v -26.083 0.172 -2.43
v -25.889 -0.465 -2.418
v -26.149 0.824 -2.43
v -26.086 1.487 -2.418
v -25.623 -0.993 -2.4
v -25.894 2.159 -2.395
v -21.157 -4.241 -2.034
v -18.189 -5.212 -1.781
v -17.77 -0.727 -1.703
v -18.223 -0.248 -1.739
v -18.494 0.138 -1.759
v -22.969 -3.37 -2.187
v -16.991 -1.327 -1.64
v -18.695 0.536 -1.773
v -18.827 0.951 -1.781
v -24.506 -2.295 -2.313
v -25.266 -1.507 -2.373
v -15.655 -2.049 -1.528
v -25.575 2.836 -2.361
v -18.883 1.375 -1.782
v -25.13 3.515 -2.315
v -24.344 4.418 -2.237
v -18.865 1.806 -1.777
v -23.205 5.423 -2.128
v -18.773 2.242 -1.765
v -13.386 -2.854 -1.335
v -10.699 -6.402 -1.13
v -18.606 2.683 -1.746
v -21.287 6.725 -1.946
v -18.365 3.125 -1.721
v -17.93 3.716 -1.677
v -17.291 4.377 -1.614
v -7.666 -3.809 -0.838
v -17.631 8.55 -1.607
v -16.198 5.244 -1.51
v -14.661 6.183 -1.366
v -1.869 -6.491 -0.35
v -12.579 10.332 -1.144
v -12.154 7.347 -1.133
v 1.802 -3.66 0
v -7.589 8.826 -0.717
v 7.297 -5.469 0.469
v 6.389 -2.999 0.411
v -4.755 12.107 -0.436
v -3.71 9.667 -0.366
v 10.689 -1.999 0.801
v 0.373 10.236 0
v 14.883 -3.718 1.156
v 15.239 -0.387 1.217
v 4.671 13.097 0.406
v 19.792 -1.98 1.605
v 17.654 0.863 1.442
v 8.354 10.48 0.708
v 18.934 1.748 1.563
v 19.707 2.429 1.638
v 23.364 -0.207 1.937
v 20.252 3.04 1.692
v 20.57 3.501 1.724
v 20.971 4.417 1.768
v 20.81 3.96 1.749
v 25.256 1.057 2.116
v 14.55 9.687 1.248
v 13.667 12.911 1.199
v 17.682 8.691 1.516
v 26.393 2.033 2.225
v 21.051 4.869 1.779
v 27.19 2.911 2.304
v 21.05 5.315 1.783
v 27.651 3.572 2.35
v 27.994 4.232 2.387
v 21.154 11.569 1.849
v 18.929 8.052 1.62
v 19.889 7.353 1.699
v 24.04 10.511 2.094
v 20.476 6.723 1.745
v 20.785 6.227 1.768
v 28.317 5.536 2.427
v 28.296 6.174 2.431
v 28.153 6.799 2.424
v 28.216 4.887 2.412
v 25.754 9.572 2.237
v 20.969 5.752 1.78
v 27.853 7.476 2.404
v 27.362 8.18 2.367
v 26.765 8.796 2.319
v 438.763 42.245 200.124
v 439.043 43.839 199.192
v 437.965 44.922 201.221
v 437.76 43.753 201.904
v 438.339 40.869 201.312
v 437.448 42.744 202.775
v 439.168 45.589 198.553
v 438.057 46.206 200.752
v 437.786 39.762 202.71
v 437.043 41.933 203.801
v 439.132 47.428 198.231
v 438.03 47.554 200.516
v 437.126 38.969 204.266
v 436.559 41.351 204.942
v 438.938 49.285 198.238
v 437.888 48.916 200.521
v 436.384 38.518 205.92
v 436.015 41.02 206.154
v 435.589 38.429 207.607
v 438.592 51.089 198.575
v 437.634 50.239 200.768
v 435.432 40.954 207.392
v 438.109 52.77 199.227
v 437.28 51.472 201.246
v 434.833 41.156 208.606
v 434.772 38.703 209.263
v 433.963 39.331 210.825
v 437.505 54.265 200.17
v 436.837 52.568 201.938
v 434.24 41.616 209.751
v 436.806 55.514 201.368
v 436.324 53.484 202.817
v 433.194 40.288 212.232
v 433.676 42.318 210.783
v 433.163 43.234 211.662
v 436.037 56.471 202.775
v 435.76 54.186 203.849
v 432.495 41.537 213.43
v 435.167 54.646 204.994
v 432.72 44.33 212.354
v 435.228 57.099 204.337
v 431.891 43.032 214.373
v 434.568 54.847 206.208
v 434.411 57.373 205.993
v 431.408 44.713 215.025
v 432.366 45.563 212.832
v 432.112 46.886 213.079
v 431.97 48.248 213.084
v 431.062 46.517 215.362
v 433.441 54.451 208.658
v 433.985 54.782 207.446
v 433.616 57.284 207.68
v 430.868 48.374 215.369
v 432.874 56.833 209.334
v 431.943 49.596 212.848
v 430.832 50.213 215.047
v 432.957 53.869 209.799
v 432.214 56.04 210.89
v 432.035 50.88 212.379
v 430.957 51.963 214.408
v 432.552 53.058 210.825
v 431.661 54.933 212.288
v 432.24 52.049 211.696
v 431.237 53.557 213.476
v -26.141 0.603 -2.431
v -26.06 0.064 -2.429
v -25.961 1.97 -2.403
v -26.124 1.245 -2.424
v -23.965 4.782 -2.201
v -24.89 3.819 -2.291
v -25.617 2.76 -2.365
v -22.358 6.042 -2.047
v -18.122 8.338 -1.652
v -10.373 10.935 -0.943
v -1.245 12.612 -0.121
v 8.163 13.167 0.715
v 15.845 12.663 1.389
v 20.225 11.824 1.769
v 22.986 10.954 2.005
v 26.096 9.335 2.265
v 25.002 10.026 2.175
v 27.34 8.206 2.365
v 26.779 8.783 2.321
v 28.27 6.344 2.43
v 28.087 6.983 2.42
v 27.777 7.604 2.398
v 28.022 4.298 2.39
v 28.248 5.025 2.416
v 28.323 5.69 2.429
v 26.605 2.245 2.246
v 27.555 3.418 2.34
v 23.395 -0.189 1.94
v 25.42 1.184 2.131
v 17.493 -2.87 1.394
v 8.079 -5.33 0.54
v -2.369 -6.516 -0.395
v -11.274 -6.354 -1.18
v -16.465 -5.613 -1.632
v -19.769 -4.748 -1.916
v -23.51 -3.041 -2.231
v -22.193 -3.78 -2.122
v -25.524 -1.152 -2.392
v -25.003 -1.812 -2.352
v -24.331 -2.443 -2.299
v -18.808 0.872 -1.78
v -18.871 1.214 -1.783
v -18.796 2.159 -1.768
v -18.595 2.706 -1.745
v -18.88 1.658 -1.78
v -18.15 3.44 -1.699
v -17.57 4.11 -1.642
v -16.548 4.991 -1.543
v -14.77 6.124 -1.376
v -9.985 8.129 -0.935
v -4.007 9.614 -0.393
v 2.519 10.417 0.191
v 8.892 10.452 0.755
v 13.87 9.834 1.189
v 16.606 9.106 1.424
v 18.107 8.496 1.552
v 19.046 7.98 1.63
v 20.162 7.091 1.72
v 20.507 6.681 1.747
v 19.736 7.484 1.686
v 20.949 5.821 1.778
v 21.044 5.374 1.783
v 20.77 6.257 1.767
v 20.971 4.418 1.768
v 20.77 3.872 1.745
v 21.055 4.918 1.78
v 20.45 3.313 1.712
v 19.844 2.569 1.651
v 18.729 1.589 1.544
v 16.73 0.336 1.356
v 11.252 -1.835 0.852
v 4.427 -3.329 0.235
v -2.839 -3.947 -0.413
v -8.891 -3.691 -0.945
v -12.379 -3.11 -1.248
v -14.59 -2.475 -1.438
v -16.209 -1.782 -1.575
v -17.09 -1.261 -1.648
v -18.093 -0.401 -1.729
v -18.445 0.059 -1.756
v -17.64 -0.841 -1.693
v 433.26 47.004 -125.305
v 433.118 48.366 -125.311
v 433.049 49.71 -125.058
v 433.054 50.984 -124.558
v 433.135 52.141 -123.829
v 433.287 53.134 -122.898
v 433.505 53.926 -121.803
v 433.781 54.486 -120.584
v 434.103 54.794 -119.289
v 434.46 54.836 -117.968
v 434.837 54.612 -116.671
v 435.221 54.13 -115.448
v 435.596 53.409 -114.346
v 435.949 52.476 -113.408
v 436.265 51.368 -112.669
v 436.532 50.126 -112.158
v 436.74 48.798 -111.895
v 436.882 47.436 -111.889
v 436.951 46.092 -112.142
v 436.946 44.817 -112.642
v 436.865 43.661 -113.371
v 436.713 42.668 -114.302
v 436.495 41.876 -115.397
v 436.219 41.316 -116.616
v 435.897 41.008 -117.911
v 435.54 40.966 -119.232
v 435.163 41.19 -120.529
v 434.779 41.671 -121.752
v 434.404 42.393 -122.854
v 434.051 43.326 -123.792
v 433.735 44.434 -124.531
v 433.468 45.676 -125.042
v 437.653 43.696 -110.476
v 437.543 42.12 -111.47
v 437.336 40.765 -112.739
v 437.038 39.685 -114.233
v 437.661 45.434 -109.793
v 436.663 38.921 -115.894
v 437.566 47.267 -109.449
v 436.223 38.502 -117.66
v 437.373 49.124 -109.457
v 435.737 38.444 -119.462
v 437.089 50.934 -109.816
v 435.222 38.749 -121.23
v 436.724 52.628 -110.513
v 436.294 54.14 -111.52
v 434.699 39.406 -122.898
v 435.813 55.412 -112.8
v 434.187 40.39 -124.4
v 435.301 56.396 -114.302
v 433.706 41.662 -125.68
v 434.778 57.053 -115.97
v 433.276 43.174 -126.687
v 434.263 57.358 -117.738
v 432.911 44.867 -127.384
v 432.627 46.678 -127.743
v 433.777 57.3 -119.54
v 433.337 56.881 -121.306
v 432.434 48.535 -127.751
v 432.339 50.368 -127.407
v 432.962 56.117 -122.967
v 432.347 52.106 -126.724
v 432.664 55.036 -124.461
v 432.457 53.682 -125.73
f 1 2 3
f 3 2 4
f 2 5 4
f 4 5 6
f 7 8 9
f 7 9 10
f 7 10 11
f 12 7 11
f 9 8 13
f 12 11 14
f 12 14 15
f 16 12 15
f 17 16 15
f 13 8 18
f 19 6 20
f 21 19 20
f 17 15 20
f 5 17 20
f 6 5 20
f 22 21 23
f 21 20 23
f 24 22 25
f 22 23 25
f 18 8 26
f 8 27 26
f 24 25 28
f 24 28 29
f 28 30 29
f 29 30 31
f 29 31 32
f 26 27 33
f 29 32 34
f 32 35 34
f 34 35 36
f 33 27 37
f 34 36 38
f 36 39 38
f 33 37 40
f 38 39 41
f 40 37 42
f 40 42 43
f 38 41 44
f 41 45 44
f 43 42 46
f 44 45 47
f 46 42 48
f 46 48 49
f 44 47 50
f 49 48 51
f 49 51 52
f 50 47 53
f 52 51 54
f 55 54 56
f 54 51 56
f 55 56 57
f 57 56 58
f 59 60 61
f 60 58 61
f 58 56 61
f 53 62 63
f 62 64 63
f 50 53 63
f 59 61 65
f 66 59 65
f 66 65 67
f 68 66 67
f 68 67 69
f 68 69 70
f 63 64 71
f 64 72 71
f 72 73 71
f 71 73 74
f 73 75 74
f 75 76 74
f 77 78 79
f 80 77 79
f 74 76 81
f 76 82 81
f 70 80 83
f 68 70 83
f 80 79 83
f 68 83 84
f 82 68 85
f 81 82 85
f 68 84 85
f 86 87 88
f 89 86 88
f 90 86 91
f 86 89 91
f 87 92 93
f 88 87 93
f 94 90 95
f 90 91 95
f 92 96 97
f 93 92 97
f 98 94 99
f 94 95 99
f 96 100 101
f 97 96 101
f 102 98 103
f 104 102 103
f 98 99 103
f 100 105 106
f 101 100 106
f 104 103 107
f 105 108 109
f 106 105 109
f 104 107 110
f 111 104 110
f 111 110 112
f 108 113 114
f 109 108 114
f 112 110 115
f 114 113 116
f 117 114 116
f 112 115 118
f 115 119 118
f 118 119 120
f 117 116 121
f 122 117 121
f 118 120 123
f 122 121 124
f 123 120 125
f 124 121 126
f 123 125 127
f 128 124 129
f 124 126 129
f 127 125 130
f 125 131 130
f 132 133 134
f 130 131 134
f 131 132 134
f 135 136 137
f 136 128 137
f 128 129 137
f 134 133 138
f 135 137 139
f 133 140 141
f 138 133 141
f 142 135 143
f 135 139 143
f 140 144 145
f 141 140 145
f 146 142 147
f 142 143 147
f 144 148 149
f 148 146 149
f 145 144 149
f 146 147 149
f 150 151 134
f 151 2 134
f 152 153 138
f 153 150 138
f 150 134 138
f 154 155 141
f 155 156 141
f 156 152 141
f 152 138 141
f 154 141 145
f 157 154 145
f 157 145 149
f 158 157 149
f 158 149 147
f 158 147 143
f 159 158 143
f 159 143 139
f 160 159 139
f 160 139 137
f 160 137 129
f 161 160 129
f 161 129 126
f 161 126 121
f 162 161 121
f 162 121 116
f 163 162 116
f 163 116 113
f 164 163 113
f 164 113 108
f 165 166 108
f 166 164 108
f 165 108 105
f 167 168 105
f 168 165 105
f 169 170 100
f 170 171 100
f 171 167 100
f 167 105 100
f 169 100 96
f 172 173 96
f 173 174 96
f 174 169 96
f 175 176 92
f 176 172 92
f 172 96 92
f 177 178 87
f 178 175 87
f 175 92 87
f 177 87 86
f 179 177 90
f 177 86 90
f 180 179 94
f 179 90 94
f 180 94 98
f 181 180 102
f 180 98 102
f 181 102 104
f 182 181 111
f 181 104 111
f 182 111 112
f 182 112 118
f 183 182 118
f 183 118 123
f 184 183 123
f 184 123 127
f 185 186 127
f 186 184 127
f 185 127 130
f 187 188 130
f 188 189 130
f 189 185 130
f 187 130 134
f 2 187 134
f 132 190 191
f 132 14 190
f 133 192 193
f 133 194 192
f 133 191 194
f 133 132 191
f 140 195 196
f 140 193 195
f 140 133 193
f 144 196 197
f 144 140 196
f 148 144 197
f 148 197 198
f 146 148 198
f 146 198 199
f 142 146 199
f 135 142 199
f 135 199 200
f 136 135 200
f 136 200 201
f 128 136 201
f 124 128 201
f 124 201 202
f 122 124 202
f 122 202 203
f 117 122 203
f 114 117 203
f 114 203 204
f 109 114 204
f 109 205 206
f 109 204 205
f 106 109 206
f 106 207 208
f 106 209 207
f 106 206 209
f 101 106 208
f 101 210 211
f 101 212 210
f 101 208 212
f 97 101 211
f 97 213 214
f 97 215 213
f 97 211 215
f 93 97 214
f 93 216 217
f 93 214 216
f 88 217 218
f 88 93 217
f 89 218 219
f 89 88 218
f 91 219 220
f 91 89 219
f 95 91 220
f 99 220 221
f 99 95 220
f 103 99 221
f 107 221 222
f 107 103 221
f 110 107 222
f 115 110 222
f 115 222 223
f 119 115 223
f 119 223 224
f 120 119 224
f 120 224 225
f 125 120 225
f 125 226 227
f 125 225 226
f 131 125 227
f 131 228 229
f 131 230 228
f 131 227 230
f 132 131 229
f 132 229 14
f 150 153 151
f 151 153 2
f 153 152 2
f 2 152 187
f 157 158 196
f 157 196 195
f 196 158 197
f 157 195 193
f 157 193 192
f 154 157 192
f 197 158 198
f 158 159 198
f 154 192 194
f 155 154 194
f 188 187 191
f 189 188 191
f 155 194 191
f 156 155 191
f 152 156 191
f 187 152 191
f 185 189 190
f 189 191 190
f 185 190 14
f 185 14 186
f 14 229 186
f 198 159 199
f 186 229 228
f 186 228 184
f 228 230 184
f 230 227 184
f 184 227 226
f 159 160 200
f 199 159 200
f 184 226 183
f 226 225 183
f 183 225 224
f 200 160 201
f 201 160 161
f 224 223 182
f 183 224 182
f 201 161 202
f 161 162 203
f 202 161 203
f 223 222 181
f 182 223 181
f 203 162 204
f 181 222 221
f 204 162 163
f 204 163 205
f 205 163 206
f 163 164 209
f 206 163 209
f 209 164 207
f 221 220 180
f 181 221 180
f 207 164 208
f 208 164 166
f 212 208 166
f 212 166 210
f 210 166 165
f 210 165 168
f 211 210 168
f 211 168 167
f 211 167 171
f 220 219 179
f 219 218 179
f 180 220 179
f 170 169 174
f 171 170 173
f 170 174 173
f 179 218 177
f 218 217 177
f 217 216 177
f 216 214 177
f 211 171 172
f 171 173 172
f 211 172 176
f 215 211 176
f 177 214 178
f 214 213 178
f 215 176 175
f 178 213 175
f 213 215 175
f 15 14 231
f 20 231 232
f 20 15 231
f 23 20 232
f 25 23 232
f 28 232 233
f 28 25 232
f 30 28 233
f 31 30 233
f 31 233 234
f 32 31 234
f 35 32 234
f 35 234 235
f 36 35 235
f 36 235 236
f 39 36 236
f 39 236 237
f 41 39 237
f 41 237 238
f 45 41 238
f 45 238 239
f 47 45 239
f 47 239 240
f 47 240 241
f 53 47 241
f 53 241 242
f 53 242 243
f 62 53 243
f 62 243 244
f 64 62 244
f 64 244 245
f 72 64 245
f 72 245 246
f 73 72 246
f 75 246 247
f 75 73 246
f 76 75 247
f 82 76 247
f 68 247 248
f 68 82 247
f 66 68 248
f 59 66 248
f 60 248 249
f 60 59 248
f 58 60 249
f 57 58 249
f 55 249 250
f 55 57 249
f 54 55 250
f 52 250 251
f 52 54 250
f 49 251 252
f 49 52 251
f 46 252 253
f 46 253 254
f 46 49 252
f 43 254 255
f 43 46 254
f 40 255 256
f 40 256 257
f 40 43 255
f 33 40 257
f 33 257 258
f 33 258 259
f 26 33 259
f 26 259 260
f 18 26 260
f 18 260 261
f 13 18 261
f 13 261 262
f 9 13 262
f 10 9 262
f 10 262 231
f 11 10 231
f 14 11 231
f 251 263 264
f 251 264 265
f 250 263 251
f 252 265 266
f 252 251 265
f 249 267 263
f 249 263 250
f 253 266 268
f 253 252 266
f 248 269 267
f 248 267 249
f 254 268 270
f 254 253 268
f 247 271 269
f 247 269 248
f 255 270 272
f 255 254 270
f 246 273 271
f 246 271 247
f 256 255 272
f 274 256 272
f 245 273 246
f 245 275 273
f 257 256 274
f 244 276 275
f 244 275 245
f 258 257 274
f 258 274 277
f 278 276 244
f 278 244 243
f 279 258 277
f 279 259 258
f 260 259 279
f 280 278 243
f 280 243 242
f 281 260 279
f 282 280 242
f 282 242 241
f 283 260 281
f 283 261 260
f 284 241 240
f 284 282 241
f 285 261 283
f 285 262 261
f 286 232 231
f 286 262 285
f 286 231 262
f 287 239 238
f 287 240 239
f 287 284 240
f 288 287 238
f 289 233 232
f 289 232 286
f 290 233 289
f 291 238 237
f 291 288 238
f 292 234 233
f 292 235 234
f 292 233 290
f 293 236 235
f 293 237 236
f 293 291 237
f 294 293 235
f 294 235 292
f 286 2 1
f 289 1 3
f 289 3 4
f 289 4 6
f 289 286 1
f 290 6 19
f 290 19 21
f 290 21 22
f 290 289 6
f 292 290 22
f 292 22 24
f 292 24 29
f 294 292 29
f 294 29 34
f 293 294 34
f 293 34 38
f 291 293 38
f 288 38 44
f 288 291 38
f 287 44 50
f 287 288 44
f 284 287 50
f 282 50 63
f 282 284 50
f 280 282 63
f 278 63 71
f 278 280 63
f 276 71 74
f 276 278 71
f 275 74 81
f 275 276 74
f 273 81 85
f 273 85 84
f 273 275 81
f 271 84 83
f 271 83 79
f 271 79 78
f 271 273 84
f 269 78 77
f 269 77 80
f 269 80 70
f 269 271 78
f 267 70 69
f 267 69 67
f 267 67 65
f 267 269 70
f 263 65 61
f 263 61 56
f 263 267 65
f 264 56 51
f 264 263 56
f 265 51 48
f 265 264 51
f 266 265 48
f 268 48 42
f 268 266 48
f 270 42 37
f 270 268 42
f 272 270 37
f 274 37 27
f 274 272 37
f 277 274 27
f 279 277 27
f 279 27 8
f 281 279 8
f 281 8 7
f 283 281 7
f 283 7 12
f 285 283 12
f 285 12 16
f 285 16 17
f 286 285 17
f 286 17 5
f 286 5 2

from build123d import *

# Parameters (mm, degrees)
SKETCH1_ON_SEGMENT_1_R                         = 9.525
SKETCH1_ON_SEGMENT_1_R_2                       = 6.985
PIPE_STANDARD_S40_PIPE_1_SCH_40_1_DEPTH        = 520.177339385
SKETCH1_R                                      = 9.525
SKETCH1_R_2                                    = 6.985
PIPE_STANDARD_S40_PIPE_1_SCH_40_1_2_DEPTH      = 452.035839287
PIPE_STANDARD_S40_PIPE_1_SCH_40_1_2_DEPTH_BACK = 37.438610879


with BuildPart() as part:
    # Sketch1 on segment 1 (carried to segment 1) → Pipe standard s40 PIPE 1 SCH 40(1) (new body)
    with BuildSketch(Plane(origin=(435, 47.900944559, 206.8), x_dir=(-0.413447533, -0.145324098, 0.898855964), z_dir=(-0.898855964, -0.092416188, -0.42838908))):
        Circle(SKETCH1_ON_SEGMENT_1_R)
        Circle(SKETCH1_ON_SEGMENT_1_R_2, mode=Mode.SUBTRACT)
    extrude(amount=PIPE_STANDARD_S40_PIPE_1_SCH_40_1_DEPTH)

    # Pipe standard s40 PIPE 1 SCH 40(1) mitre
    split(bisect_by=Plane(origin=(1.087414829, 3.28807164, 0), x_dir=(0, -0.999958714, -0.009086796), z_dir=(-0.088036608, -0.009051514, 0.996076114)), keep=Keep.TOP)


with BuildPart() as body_2:
    # Sketch1 → Pipe standard s40 PIPE 1 SCH 40_1 2 (new, two sides)
    with BuildSketch(Plane(origin=(1.087414829, 3.28807164, 0), x_dir=(-0.2491636735910112, -0.12843319629111516, -0.9599074840072245), z_dir=(0.9599074840072245, 0.09869322084943591, -0.2623685772063502))) as pipe_standard_s40_pipe_1_sch_40_1_2_sk:
        Circle(SKETCH1_R)
        Circle(SKETCH1_R_2, mode=Mode.SUBTRACT)
    extrude(amount=PIPE_STANDARD_S40_PIPE_1_SCH_40_1_2_DEPTH)
    extrude(pipe_standard_s40_pipe_1_sch_40_1_2_sk.sketch, amount=-PIPE_STANDARD_S40_PIPE_1_SCH_40_1_2_DEPTH_BACK)

    # Pipe standard s40 PIPE 1 SCH 40_1 2 mitr
    split(bisect_by=Plane(origin=(1.087414829, 3.28807164, 0), x_dir=(0, 0.999958714, 0.009086796), z_dir=(0.088036608, 0.009051514, -0.996076114)), keep=Keep.TOP)


solid = Compound([part.part, body_2.part])
